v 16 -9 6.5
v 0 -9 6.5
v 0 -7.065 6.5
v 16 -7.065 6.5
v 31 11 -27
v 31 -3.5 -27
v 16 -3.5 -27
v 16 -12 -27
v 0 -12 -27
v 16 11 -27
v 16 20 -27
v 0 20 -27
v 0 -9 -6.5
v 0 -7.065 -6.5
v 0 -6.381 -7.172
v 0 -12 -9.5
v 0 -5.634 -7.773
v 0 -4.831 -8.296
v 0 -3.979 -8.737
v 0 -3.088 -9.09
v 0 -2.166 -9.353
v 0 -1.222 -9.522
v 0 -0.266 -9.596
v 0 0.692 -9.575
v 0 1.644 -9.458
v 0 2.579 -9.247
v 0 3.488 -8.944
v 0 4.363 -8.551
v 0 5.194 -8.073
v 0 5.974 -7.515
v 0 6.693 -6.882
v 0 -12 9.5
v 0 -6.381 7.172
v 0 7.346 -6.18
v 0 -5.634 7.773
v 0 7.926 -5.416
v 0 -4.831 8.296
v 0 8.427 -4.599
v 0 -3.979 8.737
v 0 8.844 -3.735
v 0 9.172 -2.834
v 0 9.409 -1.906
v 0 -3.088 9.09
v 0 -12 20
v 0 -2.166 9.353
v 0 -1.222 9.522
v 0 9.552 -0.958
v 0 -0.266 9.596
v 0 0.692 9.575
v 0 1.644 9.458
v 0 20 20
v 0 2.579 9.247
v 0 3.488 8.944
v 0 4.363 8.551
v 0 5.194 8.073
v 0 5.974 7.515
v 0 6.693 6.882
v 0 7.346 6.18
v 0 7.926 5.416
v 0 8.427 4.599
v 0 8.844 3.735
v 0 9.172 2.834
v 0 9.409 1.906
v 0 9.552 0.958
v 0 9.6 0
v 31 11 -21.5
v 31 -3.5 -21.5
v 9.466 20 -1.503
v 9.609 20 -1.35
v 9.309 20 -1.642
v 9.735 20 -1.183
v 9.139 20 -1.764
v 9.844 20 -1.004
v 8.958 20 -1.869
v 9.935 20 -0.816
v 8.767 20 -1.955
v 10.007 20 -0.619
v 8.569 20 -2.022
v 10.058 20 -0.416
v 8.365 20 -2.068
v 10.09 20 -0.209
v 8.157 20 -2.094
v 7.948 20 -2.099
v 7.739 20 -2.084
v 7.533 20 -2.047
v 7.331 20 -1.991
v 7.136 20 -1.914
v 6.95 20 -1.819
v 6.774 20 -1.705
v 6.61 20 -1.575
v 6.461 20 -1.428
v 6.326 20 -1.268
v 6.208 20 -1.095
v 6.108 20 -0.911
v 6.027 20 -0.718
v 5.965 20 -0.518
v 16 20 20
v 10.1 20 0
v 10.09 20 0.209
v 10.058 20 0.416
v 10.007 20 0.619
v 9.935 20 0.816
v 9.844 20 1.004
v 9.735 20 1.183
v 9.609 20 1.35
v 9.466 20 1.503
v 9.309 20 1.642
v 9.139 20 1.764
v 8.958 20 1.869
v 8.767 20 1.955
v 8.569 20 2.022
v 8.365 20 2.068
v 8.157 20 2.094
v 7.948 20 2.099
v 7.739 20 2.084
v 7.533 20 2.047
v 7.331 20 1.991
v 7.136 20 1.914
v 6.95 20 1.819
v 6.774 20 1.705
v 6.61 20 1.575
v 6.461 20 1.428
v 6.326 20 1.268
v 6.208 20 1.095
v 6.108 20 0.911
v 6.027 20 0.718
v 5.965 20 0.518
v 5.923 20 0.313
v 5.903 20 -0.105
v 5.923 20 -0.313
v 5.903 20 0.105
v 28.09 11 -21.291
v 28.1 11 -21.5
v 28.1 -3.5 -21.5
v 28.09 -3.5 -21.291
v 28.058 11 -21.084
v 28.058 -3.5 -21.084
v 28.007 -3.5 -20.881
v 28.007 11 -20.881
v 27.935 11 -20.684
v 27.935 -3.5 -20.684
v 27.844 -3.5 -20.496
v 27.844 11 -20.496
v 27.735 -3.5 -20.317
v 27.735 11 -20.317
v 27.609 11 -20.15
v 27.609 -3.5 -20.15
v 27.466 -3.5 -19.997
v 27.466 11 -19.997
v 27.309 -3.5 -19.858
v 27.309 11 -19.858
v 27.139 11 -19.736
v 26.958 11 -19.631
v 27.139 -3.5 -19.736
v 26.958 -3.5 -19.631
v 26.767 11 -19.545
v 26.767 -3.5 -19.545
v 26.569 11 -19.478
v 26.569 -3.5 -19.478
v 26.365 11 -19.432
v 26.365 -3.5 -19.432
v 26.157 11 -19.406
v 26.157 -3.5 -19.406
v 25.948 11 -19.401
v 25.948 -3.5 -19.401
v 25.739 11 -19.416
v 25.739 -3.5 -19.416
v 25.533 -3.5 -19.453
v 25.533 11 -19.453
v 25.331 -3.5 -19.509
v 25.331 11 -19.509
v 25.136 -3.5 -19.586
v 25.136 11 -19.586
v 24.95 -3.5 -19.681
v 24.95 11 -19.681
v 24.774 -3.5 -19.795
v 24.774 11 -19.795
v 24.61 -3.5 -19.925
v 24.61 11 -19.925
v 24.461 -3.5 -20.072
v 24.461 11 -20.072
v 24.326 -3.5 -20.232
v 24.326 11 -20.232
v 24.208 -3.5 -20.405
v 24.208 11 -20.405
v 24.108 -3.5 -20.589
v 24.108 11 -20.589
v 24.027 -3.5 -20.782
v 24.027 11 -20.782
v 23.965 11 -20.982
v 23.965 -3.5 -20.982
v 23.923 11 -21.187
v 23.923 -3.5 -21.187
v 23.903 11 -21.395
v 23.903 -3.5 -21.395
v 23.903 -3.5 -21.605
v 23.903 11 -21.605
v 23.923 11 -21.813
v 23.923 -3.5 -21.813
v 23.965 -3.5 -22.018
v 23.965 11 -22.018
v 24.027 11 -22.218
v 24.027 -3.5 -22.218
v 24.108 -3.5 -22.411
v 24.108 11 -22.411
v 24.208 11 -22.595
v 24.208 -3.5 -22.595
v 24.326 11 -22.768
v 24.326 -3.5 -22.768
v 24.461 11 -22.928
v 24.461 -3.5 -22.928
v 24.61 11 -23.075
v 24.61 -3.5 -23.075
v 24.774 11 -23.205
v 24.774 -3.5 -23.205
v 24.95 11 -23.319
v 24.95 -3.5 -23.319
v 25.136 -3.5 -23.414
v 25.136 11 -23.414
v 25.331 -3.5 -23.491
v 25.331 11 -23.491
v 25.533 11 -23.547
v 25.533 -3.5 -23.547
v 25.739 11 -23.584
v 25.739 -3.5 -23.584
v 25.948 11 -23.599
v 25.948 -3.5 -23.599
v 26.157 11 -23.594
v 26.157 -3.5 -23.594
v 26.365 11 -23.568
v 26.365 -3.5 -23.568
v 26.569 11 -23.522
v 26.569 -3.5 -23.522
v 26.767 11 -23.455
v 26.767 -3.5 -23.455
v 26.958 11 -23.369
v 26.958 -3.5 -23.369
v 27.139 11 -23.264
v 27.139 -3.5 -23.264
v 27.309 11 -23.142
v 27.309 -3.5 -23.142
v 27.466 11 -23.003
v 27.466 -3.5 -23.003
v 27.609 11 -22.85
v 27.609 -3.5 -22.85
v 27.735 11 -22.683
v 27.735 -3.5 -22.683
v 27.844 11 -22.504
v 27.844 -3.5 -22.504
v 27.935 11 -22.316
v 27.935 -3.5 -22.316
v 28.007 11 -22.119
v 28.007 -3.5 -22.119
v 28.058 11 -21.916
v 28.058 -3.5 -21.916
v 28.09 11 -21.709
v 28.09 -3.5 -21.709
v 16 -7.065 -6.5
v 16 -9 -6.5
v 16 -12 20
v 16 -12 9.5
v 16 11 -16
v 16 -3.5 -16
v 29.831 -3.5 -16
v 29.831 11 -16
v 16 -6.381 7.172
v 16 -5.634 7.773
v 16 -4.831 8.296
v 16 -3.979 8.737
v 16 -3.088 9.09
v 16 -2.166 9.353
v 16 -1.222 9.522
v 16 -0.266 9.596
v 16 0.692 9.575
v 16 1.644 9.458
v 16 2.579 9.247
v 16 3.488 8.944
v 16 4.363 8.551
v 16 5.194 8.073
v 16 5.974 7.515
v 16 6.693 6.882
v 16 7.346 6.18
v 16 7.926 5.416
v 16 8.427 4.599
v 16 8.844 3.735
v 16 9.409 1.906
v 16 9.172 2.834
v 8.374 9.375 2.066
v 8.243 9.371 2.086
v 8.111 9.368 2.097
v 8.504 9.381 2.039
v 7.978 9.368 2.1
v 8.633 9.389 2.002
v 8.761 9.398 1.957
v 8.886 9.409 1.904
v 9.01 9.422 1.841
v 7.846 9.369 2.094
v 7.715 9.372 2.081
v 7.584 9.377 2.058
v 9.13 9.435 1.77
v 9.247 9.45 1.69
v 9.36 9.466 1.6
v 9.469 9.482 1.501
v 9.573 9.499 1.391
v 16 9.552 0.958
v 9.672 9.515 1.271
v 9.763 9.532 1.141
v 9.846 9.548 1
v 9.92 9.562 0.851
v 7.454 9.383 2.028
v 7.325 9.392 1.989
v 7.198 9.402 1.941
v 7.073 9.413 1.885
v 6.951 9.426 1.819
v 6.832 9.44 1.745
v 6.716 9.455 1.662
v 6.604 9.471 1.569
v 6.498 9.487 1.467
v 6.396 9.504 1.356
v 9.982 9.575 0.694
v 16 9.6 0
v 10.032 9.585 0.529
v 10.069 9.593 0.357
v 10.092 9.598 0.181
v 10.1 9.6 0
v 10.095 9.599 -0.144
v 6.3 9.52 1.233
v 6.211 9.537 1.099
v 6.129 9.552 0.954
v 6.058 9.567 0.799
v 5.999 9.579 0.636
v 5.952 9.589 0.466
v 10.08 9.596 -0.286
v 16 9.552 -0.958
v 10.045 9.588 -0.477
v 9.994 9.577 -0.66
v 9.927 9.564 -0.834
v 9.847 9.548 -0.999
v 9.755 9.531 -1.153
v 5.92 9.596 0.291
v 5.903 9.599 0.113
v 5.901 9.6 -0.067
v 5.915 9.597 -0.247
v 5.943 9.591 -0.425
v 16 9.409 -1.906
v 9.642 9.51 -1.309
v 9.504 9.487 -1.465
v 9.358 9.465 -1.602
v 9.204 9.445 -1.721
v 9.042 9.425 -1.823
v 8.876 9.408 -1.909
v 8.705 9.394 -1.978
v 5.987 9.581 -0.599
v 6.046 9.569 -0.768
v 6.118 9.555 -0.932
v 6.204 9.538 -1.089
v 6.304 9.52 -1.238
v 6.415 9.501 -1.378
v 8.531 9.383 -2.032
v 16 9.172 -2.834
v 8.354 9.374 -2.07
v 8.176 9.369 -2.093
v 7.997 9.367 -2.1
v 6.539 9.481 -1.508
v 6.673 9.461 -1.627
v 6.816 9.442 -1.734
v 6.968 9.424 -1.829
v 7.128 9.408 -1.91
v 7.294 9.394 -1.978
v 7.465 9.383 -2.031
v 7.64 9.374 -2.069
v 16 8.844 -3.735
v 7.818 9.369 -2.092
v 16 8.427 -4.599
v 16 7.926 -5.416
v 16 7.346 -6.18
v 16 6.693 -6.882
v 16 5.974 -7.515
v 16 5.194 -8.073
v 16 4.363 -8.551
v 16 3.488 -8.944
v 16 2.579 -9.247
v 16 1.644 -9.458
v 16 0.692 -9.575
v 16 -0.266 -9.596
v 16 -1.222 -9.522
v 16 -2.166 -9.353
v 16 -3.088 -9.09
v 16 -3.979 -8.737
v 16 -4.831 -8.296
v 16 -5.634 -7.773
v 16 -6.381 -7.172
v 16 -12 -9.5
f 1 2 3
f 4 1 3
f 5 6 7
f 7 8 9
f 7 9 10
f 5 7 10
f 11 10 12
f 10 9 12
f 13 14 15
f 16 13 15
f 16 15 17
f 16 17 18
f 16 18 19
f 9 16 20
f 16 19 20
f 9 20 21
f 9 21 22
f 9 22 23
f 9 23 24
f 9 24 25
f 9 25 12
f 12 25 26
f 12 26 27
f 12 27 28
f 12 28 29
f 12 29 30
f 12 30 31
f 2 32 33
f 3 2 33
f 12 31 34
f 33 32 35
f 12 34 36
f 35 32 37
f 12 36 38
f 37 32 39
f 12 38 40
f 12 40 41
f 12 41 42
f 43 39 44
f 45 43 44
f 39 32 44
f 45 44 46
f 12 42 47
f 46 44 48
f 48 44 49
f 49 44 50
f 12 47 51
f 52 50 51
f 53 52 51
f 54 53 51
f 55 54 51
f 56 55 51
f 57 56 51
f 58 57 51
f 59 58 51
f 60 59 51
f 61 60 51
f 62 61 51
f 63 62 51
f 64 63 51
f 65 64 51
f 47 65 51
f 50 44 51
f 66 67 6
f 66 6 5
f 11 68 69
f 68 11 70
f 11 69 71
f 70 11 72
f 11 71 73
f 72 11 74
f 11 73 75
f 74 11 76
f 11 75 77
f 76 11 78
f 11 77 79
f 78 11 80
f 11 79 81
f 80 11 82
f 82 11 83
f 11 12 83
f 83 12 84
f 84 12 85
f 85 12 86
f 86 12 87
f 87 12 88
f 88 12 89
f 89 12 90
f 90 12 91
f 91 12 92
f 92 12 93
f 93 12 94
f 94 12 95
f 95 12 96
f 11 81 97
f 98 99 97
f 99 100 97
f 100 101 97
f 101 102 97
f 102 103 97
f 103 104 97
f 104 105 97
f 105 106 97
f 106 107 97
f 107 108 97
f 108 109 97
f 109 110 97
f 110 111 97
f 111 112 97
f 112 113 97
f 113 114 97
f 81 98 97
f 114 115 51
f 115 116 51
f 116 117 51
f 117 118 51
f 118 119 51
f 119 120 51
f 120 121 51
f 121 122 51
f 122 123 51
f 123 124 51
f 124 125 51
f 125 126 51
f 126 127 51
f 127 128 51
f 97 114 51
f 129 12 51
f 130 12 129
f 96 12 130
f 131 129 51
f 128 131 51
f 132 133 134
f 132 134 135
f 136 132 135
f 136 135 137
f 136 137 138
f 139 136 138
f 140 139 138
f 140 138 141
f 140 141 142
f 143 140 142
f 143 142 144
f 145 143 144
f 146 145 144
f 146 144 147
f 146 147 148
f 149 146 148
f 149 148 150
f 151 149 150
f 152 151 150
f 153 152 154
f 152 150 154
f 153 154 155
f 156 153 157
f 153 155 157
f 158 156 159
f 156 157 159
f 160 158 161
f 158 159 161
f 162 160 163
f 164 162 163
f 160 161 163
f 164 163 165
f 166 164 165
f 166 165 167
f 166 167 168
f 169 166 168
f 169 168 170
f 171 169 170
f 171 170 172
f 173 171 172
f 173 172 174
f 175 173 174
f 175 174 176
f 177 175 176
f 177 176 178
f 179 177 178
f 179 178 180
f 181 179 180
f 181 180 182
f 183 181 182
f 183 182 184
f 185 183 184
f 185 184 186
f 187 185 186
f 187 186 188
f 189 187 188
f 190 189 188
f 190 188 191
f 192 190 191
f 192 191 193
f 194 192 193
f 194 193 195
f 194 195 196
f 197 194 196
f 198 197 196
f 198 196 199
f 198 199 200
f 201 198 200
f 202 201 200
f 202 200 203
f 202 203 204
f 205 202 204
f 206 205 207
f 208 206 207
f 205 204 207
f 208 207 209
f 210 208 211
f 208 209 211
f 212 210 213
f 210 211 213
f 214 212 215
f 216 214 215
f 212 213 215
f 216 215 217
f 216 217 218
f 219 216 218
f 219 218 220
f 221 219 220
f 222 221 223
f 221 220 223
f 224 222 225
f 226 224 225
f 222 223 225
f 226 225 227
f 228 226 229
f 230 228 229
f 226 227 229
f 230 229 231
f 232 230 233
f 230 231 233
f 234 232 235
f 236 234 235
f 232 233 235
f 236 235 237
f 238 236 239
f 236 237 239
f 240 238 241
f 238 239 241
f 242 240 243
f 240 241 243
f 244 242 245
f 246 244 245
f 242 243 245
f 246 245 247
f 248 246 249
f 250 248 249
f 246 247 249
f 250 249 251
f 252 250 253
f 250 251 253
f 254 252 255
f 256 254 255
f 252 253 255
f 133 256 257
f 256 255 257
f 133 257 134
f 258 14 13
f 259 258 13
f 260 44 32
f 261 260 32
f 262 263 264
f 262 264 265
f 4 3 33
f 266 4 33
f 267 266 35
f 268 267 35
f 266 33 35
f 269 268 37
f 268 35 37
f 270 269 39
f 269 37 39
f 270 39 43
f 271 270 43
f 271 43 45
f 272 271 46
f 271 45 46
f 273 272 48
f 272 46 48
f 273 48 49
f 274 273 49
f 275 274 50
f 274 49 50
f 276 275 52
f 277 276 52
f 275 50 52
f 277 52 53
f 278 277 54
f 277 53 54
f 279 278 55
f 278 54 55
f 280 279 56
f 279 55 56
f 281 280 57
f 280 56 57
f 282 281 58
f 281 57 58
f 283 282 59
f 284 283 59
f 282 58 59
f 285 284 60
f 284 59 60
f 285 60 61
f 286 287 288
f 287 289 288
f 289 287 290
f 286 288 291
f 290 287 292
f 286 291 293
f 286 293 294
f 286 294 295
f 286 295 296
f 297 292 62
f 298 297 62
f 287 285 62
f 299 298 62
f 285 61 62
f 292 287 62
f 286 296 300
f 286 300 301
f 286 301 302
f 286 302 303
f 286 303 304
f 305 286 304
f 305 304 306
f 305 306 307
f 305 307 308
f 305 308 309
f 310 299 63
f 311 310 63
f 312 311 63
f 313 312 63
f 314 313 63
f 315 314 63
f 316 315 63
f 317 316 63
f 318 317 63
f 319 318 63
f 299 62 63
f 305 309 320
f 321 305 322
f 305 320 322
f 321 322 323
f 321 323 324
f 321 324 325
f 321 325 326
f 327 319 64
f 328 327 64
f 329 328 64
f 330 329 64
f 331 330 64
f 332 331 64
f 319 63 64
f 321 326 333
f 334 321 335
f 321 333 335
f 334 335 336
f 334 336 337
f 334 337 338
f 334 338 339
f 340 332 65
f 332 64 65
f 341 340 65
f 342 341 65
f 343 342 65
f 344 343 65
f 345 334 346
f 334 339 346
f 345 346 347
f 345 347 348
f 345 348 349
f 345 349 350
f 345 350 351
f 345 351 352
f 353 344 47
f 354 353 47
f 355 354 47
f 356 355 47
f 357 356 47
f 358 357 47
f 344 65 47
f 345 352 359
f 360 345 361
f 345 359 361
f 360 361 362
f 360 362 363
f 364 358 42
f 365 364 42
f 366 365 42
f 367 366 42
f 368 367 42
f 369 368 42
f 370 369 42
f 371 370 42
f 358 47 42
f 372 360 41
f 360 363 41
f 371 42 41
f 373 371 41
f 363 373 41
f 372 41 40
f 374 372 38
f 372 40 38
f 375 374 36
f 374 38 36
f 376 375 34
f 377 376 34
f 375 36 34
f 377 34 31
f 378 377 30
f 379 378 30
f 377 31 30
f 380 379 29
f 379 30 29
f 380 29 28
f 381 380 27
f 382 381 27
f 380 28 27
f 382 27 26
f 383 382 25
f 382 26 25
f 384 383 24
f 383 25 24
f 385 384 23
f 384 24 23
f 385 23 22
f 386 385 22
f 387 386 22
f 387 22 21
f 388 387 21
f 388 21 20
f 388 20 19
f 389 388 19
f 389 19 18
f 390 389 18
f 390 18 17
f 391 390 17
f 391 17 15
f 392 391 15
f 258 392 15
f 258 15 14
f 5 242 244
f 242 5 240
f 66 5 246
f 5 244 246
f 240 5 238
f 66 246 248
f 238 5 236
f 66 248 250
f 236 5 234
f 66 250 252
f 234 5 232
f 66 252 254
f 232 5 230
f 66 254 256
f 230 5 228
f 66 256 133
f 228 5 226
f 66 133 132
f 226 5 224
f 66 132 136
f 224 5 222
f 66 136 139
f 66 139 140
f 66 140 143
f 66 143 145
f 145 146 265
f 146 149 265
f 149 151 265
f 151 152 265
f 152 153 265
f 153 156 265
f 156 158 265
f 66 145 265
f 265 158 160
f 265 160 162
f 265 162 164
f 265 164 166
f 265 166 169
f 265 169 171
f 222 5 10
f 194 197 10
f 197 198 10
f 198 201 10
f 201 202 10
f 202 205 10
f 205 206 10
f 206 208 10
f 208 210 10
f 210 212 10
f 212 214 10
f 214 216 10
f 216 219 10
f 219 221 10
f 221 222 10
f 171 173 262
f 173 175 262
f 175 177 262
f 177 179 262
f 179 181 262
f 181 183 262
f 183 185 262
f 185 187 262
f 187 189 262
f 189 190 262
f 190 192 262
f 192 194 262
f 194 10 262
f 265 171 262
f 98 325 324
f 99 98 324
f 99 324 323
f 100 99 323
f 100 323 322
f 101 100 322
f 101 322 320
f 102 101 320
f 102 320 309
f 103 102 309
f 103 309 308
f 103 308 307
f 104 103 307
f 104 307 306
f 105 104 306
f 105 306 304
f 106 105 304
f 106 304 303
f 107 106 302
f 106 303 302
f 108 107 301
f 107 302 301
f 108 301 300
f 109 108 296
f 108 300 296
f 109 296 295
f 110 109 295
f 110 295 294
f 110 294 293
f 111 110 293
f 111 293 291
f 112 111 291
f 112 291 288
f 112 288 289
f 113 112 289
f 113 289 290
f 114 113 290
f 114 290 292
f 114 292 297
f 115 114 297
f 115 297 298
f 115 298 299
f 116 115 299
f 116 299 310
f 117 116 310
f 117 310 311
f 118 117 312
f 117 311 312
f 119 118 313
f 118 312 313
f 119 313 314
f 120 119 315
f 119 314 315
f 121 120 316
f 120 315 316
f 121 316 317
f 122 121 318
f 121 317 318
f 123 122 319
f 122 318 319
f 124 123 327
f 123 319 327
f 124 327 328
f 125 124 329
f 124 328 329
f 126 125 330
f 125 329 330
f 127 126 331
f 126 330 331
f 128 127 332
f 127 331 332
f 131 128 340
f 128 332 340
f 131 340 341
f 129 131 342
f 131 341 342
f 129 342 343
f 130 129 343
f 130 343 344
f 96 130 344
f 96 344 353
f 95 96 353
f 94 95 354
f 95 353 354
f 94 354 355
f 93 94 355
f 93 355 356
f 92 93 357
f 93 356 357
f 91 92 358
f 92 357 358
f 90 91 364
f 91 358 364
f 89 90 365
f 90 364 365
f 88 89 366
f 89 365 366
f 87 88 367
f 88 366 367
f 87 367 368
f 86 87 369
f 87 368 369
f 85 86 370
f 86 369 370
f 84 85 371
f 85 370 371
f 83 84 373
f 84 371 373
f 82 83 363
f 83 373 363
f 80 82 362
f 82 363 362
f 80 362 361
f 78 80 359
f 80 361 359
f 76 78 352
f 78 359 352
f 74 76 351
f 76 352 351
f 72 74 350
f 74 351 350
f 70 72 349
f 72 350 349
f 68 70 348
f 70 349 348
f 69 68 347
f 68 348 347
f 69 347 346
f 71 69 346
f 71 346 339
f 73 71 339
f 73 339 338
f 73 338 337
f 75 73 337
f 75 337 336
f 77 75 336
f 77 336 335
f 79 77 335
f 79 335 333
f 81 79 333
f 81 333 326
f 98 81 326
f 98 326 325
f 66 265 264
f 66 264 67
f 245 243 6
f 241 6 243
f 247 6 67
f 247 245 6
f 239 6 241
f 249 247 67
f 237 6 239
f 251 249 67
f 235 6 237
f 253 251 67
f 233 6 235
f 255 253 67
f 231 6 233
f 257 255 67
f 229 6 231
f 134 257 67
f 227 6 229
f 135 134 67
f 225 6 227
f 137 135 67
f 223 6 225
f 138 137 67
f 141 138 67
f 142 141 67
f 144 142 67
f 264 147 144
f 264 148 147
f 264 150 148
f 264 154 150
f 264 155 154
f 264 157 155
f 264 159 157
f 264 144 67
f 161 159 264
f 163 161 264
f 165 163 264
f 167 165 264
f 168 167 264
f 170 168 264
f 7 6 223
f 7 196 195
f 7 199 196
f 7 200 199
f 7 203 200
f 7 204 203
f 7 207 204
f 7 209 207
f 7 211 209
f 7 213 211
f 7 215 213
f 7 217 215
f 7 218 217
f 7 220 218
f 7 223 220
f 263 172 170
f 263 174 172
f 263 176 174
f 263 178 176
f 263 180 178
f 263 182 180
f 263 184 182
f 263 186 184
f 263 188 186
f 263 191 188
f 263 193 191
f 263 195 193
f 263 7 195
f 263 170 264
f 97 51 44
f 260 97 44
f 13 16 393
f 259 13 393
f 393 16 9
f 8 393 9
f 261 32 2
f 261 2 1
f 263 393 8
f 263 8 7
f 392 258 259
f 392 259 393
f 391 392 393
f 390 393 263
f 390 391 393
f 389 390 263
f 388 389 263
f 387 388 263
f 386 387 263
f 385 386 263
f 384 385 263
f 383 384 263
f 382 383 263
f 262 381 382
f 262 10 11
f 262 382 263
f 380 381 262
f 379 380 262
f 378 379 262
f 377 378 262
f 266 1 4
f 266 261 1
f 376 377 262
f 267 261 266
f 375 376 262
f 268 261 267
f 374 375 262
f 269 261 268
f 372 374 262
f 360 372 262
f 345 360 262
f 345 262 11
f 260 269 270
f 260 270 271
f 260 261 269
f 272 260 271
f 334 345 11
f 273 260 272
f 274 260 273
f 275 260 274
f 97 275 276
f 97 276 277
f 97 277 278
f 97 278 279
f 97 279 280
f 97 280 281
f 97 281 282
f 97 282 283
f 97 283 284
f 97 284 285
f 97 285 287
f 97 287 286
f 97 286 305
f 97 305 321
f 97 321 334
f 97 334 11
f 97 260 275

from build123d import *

# Parameters (mm, degrees)
F1_DEPTH = 16
F2_W     = 14.5
F2_H     = 11
F3_DEPTH = 15
F5_DEPTH = 23.501
F7_D     = 4.2
F9_D     = 4.2
F10_SIZE = 3


with BuildPart() as f1:
    # F0 (on Right) → F1 (new body)
    with BuildSketch(Plane.YZ):
        with BuildLine():
            ThreePointArc((-7.0647009845, 6.5), (9.6, 0), (-7.0647009845, -6.5))
            Line((-7.0647009845, -6.5), (-12, -6.5))
            Line((-12, -6.5), (-12, -27))
            Line((-12, -27), (20, -27))
            Line((20, -27), (20, 20))
            Line((20, 20), (-12, 20))
            Line((-12, 20), (-12, 6.5))
            Line((-12, 6.5), (-7.0647009845, 6.5))
        make_face()
    extrude(amount=F1_DEPTH)

    # F2 (on face) → F3 (join)
    with BuildSketch(Plane.YZ.offset(16)):
        with Locations((3.75, -21.5)):
            Rectangle(F2_W, F2_H)
    extrude(amount=F3_DEPTH)

    # F4 (on face) → F5 (cut, through all)
    with BuildSketch(Plane.XZ.offset(3.5)):
        Polygon((29.8309389108, -16), (31, -21.5), (31, -16), align=None)
    extrude(amount=-F5_DEPTH, mode=Mode.SUBTRACT)

    # F7 (through all)
    with Locations(Plane(origin=(0, 11, 0), x_dir=(-1, 0, 0), z_dir=(0, 1, 0))):
        with Locations((-26, -21.5)):
            Hole(F7_D / 2)

    # F9 (through all)
    with Locations(Plane(origin=(0, 20, 0), x_dir=(-1, 0, 0), z_dir=(0, 1, 0))):
        with Locations((-8, 0)):
            Hole(F9_D / 2)

    # F10
    f10_edges = [f1.edges().sort_by_distance(p)[0] for p in [
        (8, -12, 6.5),
        (8, -12, -6.5),
    ]]
    chamfer(f10_edges, length=F10_SIZE)


solid = f1.part
